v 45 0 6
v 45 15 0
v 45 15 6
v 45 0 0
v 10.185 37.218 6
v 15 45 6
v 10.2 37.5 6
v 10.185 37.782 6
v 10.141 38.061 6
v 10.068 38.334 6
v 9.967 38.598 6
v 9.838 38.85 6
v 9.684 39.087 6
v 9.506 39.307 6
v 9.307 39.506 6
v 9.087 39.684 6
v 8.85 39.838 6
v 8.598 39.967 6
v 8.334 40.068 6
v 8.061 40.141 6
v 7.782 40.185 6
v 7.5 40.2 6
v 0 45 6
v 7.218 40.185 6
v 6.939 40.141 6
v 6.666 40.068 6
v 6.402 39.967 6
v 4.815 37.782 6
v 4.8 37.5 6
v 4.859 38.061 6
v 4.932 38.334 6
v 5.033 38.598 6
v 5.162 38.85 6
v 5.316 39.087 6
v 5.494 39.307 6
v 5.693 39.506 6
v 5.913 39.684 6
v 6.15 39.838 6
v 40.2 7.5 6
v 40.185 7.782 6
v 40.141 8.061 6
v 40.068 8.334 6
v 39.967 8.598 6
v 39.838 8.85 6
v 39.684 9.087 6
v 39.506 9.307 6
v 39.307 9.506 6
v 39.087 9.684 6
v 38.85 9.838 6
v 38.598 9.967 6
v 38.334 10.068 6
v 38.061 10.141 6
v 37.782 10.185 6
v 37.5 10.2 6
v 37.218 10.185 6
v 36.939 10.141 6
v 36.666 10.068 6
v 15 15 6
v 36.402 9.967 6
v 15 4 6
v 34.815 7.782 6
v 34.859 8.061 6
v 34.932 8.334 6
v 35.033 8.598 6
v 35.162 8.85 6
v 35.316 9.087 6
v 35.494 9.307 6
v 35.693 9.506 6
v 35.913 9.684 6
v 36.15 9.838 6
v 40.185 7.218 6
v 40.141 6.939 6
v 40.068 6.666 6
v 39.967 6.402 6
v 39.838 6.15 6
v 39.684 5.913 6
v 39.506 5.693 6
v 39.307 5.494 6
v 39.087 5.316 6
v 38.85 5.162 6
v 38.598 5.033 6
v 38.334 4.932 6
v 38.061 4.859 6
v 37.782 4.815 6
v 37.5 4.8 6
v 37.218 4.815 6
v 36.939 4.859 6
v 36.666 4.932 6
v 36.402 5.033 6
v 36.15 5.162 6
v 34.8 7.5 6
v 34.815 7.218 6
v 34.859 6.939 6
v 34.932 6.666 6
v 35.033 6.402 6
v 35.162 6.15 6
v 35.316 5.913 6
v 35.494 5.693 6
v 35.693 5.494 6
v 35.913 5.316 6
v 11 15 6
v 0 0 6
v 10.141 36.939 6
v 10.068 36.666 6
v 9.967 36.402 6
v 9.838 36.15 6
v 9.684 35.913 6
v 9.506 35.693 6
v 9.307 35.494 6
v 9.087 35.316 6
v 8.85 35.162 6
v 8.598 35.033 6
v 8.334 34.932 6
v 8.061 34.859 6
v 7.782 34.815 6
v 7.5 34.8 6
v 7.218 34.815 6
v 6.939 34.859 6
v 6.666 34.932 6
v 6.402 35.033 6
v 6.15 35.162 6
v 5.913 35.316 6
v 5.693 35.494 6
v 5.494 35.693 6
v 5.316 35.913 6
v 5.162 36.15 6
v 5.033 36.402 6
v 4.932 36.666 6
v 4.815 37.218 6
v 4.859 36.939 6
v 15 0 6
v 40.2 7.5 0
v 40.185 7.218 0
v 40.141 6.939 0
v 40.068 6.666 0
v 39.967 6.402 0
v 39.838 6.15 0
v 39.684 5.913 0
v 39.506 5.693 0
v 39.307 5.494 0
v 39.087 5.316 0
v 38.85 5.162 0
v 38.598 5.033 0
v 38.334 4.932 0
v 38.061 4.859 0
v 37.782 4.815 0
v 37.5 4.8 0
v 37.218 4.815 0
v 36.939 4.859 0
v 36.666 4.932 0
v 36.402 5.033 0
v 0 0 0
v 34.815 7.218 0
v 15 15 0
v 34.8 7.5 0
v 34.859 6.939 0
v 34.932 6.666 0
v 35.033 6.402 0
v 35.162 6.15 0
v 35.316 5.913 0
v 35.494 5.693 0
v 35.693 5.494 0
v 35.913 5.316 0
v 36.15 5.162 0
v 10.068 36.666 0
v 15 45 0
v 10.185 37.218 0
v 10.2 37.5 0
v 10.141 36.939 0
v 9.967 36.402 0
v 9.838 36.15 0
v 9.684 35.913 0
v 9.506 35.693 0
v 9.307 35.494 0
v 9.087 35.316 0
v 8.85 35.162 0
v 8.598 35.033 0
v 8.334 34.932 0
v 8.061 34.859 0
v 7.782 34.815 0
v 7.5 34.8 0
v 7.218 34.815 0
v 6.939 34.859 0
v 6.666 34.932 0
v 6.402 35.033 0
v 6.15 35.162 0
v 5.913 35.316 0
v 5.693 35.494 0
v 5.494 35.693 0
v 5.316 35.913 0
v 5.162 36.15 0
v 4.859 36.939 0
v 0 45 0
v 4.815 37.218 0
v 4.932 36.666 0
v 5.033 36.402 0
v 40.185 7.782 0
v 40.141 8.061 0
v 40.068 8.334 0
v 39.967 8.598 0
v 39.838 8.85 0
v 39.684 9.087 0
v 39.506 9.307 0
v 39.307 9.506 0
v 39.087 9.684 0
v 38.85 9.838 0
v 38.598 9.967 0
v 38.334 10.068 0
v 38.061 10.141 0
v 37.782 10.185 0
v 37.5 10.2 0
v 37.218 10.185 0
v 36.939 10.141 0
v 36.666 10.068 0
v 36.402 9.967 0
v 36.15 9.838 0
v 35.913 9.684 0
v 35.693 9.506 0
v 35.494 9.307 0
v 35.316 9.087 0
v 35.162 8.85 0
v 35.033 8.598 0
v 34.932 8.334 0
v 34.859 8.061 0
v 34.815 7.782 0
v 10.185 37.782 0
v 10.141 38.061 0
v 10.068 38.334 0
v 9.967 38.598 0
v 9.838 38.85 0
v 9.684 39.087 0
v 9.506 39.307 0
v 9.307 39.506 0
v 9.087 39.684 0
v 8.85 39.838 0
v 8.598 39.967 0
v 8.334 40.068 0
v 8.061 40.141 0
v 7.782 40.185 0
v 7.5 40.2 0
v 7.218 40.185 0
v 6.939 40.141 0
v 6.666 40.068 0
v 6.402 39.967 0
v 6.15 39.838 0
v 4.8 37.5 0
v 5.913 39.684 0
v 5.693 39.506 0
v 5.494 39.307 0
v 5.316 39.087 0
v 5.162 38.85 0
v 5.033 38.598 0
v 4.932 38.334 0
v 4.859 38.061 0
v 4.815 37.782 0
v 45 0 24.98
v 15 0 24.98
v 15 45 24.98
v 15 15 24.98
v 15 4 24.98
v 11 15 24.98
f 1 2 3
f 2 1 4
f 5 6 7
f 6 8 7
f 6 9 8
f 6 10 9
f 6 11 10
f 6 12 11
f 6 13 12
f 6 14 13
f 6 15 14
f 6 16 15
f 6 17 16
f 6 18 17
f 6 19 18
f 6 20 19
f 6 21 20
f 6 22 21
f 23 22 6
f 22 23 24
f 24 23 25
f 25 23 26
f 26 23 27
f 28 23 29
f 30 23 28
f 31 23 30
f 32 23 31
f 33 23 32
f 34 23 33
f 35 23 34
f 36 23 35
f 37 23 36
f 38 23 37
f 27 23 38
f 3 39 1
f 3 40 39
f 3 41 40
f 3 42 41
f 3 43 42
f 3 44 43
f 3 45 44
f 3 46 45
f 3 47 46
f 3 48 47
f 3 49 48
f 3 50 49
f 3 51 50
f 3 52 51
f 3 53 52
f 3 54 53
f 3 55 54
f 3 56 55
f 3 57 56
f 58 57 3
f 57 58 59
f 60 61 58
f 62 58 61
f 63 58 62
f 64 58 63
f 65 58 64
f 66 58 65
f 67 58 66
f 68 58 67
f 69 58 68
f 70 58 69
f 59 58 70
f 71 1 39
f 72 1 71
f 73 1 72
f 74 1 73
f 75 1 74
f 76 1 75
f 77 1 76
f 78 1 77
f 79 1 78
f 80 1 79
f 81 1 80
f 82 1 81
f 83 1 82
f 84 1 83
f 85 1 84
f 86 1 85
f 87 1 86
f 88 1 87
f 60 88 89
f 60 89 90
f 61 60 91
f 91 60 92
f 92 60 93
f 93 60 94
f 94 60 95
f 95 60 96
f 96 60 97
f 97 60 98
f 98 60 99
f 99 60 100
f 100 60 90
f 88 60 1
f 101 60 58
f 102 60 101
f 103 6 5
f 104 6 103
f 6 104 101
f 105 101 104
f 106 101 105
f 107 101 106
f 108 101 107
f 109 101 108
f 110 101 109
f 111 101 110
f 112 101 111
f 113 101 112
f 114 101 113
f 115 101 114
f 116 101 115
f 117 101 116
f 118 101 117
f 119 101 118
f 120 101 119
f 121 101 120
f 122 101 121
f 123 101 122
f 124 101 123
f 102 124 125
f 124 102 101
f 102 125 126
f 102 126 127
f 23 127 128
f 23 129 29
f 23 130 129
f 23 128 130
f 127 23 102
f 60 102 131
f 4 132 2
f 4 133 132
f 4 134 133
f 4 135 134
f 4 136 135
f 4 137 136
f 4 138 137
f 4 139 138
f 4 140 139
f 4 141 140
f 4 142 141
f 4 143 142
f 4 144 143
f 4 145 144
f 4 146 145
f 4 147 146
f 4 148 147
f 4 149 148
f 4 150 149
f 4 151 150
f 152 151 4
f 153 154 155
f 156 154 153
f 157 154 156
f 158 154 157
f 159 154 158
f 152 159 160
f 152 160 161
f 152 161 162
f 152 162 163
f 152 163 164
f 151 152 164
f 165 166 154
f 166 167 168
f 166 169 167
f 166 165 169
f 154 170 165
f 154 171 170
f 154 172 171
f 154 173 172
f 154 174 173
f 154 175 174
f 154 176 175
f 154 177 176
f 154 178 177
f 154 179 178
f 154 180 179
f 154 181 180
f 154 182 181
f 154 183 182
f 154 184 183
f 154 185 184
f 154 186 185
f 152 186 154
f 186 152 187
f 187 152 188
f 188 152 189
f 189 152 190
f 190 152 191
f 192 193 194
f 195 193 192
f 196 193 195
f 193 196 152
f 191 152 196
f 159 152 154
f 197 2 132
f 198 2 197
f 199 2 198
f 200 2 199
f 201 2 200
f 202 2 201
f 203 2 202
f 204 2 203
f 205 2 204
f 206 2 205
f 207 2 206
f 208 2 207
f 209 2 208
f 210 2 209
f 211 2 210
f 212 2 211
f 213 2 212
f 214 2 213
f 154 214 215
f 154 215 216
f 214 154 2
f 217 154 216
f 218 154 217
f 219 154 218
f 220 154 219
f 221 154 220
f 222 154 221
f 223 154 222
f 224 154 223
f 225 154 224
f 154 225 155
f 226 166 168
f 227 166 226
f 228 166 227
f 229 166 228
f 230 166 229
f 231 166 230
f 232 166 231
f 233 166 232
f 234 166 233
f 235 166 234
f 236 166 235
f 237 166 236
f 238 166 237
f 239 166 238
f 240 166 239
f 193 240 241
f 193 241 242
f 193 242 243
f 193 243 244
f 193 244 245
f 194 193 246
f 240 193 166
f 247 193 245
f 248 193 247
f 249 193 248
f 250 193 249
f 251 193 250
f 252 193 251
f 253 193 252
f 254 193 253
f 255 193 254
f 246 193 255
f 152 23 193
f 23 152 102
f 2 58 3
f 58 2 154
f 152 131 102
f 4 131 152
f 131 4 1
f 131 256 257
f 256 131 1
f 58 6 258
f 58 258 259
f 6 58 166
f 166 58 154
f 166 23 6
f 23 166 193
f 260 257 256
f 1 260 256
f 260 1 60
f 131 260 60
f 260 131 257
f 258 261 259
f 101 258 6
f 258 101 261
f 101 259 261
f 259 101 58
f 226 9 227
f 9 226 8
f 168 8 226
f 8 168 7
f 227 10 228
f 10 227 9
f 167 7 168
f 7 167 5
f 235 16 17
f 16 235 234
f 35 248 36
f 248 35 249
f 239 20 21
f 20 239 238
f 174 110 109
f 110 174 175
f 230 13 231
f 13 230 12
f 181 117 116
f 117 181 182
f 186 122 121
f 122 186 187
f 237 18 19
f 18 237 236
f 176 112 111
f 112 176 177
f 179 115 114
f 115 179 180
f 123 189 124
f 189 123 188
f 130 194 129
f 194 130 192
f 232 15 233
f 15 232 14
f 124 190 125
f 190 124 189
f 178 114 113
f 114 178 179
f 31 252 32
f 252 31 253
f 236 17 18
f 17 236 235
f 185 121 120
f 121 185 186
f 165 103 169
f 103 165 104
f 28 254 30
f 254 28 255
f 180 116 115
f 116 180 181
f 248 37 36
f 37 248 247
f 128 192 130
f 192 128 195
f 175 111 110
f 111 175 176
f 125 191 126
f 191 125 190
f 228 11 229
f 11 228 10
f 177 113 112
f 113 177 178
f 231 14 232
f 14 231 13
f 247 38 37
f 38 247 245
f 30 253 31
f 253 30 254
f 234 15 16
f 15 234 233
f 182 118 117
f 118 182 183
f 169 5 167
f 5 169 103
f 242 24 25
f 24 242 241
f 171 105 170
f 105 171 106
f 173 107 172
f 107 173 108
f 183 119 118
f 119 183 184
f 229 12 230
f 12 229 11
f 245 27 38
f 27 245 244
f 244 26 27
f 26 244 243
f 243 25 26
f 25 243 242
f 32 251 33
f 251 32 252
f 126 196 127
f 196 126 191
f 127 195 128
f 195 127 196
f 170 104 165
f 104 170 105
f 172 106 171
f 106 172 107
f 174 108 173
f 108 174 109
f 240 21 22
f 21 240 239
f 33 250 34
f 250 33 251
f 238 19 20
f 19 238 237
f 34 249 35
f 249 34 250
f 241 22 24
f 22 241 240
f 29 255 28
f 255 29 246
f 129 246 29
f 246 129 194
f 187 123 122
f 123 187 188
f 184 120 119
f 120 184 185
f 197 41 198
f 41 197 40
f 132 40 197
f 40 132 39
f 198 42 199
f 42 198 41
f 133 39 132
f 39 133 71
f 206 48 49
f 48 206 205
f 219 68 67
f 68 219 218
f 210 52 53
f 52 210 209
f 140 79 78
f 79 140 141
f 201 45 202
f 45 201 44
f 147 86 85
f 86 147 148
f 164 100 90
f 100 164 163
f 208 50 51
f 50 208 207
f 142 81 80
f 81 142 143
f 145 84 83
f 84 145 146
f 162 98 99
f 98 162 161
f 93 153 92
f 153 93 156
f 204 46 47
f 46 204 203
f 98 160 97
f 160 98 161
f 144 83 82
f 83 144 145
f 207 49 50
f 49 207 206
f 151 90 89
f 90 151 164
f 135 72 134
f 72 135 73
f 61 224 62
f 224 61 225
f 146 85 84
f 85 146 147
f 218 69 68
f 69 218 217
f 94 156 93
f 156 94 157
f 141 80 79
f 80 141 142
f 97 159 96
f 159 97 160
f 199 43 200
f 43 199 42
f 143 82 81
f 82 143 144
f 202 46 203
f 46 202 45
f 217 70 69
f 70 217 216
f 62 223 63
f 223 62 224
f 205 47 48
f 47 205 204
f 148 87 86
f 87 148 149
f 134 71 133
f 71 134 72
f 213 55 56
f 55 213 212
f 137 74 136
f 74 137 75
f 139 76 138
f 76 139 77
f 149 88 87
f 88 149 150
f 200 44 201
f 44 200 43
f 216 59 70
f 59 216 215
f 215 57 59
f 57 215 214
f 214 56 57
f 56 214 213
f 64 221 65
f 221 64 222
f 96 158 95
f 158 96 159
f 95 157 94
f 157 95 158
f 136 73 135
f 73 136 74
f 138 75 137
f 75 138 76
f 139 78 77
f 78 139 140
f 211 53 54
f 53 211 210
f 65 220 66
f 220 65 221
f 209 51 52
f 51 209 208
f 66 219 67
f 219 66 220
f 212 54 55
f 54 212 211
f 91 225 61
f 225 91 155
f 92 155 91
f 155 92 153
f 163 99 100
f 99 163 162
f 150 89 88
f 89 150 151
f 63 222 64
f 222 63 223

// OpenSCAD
// Reinforced right-angle gusset for 15 mm profile.
$fn = 60;
eps = 0.02;
profile = 15;
arm = 45;
plate_t = 6;
rib_t = 4;
rib_h = 19;
module rib_x() {
    translate([profile, 0, plate_t - eps]) linear_extrude(height = rib_h)
        polygon(points = [[0, 0], [arm - profile, 0], [0, rib_t]]);
}
module rib_y() {
    translate([profile, profile, plate_t - eps]) rotate([0, 0, 90]) linear_extrude(height = rib_h)
        polygon(points = [[0, 0], [arm - profile, 0], [0, rib_t]]);
}
difference() {
    union() { cube([arm, profile, plate_t]); cube([profile, arm, plate_t]); rib_x(); rib_y(); }
    for (p = [[profile / 2, arm - profile / 2], [arm - profile / 2, profile / 2]])
        translate([p[0], p[1], -eps]) cylinder(d = 5.4, h = plate_t + 2 * eps);
}
